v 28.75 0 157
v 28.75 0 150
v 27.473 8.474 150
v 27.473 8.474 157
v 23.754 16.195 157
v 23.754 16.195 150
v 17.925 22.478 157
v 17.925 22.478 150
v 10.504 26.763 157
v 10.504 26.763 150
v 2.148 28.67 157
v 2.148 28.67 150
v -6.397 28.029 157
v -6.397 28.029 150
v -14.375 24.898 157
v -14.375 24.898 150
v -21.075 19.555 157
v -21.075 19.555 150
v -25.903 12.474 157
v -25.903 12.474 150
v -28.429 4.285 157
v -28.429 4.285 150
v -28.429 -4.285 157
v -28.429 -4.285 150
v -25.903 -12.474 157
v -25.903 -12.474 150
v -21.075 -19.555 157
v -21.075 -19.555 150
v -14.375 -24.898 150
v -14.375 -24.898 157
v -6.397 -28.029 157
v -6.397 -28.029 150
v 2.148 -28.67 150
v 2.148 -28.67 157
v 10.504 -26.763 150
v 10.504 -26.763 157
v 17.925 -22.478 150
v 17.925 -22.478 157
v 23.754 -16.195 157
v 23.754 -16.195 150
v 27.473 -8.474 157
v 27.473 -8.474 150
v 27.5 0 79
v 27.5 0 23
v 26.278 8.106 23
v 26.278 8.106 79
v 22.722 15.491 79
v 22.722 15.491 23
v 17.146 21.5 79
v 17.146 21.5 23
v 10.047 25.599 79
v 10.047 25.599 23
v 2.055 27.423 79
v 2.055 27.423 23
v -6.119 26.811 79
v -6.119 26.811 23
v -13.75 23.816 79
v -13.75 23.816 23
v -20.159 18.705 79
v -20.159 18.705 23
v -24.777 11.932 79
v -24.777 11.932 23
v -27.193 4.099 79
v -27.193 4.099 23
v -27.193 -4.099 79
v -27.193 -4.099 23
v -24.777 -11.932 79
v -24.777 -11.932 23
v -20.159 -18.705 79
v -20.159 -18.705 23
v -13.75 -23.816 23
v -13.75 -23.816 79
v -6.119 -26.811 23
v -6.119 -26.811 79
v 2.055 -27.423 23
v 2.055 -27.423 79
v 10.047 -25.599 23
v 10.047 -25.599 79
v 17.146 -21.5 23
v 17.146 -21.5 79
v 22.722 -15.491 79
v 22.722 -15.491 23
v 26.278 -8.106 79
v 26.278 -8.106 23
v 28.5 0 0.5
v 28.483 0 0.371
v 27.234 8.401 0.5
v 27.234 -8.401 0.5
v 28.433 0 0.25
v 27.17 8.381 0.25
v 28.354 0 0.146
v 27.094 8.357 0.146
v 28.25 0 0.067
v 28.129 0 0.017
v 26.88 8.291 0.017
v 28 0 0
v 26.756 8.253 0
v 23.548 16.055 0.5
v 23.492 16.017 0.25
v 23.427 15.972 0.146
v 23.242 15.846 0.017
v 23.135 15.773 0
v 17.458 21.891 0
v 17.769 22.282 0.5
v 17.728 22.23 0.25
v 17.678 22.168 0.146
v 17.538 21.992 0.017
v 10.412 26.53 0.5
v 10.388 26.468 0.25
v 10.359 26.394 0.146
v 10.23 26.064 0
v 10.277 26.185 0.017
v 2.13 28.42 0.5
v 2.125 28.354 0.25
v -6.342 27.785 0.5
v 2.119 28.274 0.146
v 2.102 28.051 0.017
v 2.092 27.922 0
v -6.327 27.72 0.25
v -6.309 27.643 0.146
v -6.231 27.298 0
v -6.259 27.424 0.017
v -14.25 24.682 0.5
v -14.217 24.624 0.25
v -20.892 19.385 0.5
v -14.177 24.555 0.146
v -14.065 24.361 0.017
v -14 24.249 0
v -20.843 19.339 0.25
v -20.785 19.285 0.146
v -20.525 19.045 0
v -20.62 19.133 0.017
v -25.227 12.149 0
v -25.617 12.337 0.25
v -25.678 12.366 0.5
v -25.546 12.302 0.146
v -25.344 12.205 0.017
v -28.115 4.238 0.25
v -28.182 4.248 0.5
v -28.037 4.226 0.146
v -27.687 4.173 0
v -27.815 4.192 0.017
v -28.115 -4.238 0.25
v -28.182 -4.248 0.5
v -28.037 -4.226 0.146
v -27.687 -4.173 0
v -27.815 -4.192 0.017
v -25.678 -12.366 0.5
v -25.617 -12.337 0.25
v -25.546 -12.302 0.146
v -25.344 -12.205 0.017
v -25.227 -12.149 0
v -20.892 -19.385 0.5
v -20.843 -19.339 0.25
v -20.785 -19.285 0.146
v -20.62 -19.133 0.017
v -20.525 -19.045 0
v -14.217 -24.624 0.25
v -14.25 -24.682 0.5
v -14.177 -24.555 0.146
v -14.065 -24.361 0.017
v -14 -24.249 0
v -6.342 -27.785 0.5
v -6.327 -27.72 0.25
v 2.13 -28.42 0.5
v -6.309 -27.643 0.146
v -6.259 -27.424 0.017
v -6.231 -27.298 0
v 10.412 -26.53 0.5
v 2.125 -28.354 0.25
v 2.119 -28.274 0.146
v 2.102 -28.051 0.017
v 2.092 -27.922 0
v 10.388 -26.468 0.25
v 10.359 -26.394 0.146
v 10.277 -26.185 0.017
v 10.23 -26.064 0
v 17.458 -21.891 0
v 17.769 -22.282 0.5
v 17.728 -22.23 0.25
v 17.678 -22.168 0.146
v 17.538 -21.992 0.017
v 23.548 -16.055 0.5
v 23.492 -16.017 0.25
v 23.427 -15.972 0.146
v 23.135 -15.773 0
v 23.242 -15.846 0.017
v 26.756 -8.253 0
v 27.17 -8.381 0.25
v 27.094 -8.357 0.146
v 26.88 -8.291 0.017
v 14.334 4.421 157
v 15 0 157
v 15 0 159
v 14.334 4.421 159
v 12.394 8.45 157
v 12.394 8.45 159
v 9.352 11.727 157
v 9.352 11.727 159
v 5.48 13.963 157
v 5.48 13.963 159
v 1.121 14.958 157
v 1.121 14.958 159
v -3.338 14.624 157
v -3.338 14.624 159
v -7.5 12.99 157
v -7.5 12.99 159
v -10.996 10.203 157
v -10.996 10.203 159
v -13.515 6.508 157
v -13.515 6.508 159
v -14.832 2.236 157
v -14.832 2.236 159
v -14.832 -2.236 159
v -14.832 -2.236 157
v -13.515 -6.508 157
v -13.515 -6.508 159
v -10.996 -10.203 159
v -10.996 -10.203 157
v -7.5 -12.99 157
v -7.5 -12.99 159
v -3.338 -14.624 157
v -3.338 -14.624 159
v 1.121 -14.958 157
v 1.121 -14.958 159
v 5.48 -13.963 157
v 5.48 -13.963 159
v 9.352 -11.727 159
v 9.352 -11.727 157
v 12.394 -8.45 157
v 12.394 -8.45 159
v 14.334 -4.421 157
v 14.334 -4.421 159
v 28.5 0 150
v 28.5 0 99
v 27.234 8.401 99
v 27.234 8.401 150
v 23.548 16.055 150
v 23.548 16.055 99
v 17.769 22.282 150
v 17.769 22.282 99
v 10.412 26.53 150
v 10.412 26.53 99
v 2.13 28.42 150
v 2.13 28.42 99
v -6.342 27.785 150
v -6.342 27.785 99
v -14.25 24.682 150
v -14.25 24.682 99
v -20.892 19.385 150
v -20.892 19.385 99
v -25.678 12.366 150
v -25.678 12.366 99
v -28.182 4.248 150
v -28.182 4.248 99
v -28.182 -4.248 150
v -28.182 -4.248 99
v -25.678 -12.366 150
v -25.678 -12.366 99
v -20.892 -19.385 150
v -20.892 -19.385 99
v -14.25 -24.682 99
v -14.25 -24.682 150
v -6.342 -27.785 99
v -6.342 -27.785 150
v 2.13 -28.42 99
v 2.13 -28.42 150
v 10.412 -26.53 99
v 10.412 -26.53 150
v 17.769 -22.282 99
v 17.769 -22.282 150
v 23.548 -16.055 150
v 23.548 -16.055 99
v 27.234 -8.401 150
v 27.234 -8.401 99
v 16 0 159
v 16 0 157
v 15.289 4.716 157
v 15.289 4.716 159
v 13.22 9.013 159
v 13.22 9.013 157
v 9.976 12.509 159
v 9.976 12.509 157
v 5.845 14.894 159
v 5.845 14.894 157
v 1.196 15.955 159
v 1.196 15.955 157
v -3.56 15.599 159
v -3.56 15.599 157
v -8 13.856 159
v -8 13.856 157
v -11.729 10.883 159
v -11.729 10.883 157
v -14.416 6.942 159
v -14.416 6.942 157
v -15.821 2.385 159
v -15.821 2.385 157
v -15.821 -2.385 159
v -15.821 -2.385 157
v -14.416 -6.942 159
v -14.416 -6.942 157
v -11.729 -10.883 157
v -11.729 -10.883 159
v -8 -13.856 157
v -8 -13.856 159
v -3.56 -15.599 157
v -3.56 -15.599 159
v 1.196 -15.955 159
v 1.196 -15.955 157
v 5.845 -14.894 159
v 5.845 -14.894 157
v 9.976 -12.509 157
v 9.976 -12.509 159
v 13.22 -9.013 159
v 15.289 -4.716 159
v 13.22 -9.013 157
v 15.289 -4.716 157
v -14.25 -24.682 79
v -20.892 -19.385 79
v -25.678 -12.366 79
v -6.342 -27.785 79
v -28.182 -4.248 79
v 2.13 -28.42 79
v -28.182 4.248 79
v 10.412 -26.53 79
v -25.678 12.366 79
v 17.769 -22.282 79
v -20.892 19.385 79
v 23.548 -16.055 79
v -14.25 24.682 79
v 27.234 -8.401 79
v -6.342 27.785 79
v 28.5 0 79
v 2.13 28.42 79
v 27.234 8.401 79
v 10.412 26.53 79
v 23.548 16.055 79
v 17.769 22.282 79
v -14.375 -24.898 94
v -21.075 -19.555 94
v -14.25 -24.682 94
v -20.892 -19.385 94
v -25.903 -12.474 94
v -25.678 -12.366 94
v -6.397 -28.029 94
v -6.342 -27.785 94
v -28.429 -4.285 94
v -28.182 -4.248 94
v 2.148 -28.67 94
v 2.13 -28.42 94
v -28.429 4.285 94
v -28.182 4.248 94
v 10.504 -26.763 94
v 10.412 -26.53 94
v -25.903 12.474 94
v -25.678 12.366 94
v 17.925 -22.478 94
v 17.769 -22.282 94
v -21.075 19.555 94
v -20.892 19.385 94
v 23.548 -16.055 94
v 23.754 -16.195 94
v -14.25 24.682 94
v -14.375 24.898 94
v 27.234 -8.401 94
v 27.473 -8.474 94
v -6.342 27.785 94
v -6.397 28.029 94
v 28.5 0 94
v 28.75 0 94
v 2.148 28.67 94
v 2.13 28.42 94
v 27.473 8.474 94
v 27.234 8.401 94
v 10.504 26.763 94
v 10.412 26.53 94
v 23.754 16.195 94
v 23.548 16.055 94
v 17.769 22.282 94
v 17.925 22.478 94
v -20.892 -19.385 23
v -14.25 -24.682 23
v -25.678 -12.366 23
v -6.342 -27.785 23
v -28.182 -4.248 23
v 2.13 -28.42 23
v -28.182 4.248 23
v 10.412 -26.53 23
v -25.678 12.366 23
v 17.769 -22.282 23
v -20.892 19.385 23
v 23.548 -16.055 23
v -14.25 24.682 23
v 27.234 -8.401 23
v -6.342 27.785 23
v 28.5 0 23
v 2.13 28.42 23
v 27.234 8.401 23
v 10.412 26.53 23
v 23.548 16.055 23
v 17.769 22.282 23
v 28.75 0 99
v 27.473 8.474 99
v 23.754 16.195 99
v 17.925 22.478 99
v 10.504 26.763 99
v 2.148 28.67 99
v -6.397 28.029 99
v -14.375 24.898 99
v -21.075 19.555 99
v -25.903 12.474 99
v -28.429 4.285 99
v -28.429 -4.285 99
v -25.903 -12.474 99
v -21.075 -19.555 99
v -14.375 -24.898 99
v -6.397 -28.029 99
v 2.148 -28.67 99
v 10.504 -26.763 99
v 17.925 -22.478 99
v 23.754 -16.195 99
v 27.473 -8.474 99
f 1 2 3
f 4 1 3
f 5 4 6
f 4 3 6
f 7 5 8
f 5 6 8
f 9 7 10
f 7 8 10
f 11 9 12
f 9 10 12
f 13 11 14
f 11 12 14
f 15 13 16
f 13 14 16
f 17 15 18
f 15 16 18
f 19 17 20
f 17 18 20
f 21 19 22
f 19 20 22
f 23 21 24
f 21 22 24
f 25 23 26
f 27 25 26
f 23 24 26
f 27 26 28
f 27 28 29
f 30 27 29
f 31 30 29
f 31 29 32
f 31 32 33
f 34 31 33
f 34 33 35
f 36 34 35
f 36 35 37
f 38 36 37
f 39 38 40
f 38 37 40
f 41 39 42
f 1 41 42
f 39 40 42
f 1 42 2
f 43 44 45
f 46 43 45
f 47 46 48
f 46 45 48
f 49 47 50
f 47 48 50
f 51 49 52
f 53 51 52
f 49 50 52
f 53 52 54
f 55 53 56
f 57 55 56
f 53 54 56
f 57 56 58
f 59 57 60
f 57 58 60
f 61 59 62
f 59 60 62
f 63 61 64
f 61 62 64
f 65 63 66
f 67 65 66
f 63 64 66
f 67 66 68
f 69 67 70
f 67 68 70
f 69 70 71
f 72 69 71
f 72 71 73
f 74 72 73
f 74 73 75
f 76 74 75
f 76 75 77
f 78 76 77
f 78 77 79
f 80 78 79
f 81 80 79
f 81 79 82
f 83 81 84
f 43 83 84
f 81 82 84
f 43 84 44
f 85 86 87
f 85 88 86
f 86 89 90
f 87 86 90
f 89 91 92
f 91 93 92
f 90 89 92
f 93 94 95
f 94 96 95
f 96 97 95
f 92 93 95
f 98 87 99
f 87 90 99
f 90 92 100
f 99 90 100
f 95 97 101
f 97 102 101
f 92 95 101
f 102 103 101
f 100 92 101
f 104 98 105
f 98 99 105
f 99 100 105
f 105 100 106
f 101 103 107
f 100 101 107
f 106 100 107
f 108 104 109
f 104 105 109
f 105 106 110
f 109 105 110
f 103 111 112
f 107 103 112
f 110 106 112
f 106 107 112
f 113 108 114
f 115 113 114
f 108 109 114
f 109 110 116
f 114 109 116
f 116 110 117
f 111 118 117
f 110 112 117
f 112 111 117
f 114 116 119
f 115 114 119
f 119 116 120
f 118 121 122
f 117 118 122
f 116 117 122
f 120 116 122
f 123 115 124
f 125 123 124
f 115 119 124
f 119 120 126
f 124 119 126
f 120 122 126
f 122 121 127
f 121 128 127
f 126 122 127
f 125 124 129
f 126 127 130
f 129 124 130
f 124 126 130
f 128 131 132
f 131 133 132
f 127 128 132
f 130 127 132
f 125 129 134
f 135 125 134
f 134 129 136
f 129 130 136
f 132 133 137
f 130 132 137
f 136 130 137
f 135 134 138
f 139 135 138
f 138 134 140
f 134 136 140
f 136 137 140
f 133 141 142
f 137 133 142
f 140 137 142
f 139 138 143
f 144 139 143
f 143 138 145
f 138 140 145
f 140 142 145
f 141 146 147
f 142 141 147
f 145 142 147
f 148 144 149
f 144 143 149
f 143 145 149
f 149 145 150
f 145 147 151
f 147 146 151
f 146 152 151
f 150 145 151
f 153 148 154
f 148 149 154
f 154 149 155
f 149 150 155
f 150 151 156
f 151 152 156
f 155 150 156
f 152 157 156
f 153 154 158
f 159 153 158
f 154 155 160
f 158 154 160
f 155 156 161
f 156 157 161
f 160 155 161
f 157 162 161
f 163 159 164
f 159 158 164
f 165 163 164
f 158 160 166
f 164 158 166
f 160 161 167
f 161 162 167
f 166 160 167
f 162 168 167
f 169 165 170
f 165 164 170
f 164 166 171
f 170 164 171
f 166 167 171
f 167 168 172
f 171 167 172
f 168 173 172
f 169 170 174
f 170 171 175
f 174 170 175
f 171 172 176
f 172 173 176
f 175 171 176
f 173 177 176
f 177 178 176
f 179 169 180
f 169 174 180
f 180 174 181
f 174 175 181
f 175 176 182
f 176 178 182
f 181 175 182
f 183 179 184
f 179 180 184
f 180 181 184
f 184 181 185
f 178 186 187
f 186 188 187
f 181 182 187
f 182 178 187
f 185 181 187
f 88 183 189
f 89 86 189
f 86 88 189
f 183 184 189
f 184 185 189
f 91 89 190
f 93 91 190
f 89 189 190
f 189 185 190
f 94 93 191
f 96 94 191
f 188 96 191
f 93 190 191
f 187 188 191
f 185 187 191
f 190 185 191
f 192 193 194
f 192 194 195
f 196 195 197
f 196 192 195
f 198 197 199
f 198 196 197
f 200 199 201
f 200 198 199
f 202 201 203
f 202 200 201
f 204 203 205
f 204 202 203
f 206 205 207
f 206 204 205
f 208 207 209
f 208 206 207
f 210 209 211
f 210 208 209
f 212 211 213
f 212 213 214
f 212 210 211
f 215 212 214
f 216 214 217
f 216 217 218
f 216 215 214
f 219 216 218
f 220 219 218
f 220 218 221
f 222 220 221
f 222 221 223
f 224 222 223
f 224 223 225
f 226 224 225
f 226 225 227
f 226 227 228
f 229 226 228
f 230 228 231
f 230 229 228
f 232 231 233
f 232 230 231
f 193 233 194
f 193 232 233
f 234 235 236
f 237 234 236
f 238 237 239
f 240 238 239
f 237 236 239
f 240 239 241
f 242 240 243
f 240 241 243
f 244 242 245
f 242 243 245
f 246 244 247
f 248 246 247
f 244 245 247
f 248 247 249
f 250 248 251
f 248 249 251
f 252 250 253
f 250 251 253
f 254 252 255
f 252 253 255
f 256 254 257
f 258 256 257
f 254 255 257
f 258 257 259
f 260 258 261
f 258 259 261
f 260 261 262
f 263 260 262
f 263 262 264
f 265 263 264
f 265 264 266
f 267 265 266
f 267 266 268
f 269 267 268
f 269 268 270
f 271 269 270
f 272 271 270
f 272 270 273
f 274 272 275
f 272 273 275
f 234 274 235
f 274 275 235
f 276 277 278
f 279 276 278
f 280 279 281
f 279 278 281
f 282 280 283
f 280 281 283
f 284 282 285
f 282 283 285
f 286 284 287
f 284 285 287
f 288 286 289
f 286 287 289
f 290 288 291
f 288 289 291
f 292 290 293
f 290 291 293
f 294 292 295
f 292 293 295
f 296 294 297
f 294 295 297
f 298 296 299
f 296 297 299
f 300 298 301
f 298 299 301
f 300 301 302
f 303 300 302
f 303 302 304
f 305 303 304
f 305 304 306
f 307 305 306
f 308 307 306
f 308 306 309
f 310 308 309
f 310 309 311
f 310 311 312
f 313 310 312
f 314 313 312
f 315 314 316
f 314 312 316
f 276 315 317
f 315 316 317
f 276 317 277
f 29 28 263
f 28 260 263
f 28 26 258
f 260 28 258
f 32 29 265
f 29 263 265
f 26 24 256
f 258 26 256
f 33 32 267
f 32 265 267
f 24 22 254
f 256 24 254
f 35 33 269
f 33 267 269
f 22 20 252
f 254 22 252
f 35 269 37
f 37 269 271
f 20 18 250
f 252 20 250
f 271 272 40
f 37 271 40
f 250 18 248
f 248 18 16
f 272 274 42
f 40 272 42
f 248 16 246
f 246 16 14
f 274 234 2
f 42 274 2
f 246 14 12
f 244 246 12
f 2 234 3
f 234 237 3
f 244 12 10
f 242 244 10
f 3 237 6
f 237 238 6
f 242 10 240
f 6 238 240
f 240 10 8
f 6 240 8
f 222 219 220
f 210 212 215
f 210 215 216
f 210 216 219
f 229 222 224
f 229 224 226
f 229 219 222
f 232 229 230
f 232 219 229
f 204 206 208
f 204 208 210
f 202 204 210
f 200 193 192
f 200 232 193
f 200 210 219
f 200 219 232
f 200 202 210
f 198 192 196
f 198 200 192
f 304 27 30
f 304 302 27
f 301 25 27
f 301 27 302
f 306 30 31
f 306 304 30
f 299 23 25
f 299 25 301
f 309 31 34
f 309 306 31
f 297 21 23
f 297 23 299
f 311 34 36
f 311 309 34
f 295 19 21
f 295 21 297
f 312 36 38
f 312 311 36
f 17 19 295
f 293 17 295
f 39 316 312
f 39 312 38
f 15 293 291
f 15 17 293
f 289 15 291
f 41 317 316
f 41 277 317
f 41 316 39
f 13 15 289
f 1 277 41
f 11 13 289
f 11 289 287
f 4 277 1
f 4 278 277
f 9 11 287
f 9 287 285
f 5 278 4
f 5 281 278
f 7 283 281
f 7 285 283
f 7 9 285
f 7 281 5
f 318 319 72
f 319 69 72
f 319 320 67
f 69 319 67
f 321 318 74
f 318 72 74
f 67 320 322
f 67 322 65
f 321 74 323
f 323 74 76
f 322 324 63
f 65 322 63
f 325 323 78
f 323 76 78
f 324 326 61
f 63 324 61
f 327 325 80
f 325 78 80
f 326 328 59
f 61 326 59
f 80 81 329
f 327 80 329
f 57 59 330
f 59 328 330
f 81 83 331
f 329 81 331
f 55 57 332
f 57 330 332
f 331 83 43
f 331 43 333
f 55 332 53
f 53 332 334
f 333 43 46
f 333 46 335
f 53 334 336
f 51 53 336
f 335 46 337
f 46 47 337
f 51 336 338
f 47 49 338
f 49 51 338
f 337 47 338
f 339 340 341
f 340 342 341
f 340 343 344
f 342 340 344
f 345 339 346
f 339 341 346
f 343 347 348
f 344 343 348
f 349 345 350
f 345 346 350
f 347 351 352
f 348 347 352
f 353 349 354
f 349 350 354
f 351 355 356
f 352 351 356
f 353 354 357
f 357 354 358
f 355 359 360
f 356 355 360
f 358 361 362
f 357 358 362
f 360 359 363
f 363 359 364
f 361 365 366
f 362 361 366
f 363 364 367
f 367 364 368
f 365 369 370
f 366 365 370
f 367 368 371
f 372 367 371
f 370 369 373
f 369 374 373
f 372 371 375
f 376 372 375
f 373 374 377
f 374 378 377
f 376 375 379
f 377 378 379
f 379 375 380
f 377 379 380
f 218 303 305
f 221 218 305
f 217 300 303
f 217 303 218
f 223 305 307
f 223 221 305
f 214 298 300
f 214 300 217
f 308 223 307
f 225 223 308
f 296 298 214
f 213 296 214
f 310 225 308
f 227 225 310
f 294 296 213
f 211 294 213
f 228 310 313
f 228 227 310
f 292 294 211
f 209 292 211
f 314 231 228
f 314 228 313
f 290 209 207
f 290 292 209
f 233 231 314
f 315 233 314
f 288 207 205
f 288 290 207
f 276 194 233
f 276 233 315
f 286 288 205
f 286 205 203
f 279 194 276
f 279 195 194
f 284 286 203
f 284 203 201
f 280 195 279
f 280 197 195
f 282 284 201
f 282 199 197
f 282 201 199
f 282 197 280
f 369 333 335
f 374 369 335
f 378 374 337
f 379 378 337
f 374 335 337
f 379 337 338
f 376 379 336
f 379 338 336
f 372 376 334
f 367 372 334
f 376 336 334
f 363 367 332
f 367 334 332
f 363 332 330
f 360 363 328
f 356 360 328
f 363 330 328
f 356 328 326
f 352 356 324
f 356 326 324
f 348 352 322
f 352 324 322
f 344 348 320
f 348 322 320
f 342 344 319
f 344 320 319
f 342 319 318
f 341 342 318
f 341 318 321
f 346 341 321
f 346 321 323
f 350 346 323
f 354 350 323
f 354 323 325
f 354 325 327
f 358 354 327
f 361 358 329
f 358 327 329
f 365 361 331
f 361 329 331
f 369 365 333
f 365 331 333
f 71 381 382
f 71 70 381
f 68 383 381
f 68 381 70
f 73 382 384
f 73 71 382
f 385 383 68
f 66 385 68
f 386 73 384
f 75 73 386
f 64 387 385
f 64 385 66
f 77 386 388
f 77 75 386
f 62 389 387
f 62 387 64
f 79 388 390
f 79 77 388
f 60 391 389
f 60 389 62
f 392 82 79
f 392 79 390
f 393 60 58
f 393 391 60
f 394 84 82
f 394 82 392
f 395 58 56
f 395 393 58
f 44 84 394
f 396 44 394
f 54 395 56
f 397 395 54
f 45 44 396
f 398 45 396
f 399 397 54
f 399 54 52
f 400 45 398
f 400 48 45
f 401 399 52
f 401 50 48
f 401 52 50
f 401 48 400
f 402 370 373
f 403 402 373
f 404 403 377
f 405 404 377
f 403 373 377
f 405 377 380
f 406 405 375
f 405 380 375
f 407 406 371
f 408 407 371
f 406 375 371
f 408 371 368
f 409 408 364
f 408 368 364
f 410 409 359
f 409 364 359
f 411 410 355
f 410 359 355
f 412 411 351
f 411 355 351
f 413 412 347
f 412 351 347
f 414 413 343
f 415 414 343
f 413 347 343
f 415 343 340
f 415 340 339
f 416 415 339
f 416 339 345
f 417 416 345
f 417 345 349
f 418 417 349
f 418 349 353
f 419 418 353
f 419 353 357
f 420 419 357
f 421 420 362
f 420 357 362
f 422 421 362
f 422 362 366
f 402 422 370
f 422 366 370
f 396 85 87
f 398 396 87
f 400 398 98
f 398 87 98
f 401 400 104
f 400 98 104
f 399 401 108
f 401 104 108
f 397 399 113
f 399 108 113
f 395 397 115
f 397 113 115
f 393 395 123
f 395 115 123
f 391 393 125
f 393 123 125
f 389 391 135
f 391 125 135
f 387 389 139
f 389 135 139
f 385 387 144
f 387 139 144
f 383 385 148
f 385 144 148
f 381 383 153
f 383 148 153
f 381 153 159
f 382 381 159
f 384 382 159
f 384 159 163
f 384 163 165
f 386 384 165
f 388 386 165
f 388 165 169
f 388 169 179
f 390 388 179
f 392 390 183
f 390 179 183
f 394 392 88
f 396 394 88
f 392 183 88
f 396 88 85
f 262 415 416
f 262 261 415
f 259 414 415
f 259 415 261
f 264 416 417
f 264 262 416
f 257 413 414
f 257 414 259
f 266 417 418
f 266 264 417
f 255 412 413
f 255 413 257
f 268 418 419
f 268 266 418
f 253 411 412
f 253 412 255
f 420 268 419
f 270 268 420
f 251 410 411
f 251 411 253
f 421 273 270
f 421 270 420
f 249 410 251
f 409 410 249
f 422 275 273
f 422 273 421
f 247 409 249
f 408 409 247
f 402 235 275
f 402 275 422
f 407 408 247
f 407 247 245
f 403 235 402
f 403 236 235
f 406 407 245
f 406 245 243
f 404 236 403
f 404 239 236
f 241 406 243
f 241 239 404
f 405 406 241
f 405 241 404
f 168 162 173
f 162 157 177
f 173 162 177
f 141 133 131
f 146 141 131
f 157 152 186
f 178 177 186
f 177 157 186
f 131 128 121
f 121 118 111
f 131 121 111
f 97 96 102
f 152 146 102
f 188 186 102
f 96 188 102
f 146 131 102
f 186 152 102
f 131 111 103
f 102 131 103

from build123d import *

# Parameters (mm, degrees)
ESQUISSE1_R        = 28.5
BOSS_EXTRU_1_DEPTH = 23
ESQUISSE3_R        = 27.5
BOSS_EXTRU_2_DEPTH = 56
ESQUISSE4_R        = 28.5
BOSS_EXTRU_3_DEPTH = 15
ESQUISSE5_R        = 28.75
BOSS_EXTRU_4_DEPTH = 5
ESQUISSE6_R        = 28.5
BOSS_EXTRU_5_DEPTH = 51
ESQUISSE7_R        = 28.75
BOSS_EXTRU_6_DEPTH = 7
CONG_1_R           = 0.5
ESQUISSE8_R        = 16
ESQUISSE8_R_2      = 15
BOSS_EXTRU_7_DEPTH = 2


with BuildPart() as part:
    # Esquisse1 → Boss.-Extru.1 (new body)
    with BuildSketch(Plane.XY):
        Circle(ESQUISSE1_R)
    extrude(amount=BOSS_EXTRU_1_DEPTH)

    # Esquisse3 → Boss.-Extru.2 (add)
    with BuildSketch(Plane.XY.offset(23)):
        Circle(ESQUISSE3_R)
    extrude(amount=BOSS_EXTRU_2_DEPTH)

    # Esquisse4 → Boss.-Extru.3 (add)
    with BuildSketch(Plane.XY.offset(79)):
        Circle(ESQUISSE4_R)
    extrude(amount=BOSS_EXTRU_3_DEPTH)

    # Esquisse5 → Boss.-Extru.4 (add)
    with BuildSketch(Plane.XY.offset(94)):
        Circle(ESQUISSE5_R)
    extrude(amount=BOSS_EXTRU_4_DEPTH)

    # Esquisse6 → Boss.-Extru.5 (add)
    with BuildSketch(Plane.XY.offset(99)):
        Circle(ESQUISSE6_R)
    extrude(amount=BOSS_EXTRU_5_DEPTH)

    # Esquisse7 → Boss.-Extru.6 (add)
    with BuildSketch(Plane.XY.offset(150)):
        Circle(ESQUISSE7_R)
    extrude(amount=BOSS_EXTRU_6_DEPTH)

    # Congé1
    cong_1_edges = [part.edges().sort_by_distance(p)[0] for p in [
        (-28.5, 0, 0),
    ]]
    fillet(cong_1_edges, radius=CONG_1_R)

    # Esquisse8 → Boss.-Extru.7 (add)
    with BuildSketch(Plane.XY.offset(157)):
        Circle(ESQUISSE8_R)
        Circle(ESQUISSE8_R_2, mode=Mode.SUBTRACT)
    extrude(amount=BOSS_EXTRU_7_DEPTH)


solid = part.part
